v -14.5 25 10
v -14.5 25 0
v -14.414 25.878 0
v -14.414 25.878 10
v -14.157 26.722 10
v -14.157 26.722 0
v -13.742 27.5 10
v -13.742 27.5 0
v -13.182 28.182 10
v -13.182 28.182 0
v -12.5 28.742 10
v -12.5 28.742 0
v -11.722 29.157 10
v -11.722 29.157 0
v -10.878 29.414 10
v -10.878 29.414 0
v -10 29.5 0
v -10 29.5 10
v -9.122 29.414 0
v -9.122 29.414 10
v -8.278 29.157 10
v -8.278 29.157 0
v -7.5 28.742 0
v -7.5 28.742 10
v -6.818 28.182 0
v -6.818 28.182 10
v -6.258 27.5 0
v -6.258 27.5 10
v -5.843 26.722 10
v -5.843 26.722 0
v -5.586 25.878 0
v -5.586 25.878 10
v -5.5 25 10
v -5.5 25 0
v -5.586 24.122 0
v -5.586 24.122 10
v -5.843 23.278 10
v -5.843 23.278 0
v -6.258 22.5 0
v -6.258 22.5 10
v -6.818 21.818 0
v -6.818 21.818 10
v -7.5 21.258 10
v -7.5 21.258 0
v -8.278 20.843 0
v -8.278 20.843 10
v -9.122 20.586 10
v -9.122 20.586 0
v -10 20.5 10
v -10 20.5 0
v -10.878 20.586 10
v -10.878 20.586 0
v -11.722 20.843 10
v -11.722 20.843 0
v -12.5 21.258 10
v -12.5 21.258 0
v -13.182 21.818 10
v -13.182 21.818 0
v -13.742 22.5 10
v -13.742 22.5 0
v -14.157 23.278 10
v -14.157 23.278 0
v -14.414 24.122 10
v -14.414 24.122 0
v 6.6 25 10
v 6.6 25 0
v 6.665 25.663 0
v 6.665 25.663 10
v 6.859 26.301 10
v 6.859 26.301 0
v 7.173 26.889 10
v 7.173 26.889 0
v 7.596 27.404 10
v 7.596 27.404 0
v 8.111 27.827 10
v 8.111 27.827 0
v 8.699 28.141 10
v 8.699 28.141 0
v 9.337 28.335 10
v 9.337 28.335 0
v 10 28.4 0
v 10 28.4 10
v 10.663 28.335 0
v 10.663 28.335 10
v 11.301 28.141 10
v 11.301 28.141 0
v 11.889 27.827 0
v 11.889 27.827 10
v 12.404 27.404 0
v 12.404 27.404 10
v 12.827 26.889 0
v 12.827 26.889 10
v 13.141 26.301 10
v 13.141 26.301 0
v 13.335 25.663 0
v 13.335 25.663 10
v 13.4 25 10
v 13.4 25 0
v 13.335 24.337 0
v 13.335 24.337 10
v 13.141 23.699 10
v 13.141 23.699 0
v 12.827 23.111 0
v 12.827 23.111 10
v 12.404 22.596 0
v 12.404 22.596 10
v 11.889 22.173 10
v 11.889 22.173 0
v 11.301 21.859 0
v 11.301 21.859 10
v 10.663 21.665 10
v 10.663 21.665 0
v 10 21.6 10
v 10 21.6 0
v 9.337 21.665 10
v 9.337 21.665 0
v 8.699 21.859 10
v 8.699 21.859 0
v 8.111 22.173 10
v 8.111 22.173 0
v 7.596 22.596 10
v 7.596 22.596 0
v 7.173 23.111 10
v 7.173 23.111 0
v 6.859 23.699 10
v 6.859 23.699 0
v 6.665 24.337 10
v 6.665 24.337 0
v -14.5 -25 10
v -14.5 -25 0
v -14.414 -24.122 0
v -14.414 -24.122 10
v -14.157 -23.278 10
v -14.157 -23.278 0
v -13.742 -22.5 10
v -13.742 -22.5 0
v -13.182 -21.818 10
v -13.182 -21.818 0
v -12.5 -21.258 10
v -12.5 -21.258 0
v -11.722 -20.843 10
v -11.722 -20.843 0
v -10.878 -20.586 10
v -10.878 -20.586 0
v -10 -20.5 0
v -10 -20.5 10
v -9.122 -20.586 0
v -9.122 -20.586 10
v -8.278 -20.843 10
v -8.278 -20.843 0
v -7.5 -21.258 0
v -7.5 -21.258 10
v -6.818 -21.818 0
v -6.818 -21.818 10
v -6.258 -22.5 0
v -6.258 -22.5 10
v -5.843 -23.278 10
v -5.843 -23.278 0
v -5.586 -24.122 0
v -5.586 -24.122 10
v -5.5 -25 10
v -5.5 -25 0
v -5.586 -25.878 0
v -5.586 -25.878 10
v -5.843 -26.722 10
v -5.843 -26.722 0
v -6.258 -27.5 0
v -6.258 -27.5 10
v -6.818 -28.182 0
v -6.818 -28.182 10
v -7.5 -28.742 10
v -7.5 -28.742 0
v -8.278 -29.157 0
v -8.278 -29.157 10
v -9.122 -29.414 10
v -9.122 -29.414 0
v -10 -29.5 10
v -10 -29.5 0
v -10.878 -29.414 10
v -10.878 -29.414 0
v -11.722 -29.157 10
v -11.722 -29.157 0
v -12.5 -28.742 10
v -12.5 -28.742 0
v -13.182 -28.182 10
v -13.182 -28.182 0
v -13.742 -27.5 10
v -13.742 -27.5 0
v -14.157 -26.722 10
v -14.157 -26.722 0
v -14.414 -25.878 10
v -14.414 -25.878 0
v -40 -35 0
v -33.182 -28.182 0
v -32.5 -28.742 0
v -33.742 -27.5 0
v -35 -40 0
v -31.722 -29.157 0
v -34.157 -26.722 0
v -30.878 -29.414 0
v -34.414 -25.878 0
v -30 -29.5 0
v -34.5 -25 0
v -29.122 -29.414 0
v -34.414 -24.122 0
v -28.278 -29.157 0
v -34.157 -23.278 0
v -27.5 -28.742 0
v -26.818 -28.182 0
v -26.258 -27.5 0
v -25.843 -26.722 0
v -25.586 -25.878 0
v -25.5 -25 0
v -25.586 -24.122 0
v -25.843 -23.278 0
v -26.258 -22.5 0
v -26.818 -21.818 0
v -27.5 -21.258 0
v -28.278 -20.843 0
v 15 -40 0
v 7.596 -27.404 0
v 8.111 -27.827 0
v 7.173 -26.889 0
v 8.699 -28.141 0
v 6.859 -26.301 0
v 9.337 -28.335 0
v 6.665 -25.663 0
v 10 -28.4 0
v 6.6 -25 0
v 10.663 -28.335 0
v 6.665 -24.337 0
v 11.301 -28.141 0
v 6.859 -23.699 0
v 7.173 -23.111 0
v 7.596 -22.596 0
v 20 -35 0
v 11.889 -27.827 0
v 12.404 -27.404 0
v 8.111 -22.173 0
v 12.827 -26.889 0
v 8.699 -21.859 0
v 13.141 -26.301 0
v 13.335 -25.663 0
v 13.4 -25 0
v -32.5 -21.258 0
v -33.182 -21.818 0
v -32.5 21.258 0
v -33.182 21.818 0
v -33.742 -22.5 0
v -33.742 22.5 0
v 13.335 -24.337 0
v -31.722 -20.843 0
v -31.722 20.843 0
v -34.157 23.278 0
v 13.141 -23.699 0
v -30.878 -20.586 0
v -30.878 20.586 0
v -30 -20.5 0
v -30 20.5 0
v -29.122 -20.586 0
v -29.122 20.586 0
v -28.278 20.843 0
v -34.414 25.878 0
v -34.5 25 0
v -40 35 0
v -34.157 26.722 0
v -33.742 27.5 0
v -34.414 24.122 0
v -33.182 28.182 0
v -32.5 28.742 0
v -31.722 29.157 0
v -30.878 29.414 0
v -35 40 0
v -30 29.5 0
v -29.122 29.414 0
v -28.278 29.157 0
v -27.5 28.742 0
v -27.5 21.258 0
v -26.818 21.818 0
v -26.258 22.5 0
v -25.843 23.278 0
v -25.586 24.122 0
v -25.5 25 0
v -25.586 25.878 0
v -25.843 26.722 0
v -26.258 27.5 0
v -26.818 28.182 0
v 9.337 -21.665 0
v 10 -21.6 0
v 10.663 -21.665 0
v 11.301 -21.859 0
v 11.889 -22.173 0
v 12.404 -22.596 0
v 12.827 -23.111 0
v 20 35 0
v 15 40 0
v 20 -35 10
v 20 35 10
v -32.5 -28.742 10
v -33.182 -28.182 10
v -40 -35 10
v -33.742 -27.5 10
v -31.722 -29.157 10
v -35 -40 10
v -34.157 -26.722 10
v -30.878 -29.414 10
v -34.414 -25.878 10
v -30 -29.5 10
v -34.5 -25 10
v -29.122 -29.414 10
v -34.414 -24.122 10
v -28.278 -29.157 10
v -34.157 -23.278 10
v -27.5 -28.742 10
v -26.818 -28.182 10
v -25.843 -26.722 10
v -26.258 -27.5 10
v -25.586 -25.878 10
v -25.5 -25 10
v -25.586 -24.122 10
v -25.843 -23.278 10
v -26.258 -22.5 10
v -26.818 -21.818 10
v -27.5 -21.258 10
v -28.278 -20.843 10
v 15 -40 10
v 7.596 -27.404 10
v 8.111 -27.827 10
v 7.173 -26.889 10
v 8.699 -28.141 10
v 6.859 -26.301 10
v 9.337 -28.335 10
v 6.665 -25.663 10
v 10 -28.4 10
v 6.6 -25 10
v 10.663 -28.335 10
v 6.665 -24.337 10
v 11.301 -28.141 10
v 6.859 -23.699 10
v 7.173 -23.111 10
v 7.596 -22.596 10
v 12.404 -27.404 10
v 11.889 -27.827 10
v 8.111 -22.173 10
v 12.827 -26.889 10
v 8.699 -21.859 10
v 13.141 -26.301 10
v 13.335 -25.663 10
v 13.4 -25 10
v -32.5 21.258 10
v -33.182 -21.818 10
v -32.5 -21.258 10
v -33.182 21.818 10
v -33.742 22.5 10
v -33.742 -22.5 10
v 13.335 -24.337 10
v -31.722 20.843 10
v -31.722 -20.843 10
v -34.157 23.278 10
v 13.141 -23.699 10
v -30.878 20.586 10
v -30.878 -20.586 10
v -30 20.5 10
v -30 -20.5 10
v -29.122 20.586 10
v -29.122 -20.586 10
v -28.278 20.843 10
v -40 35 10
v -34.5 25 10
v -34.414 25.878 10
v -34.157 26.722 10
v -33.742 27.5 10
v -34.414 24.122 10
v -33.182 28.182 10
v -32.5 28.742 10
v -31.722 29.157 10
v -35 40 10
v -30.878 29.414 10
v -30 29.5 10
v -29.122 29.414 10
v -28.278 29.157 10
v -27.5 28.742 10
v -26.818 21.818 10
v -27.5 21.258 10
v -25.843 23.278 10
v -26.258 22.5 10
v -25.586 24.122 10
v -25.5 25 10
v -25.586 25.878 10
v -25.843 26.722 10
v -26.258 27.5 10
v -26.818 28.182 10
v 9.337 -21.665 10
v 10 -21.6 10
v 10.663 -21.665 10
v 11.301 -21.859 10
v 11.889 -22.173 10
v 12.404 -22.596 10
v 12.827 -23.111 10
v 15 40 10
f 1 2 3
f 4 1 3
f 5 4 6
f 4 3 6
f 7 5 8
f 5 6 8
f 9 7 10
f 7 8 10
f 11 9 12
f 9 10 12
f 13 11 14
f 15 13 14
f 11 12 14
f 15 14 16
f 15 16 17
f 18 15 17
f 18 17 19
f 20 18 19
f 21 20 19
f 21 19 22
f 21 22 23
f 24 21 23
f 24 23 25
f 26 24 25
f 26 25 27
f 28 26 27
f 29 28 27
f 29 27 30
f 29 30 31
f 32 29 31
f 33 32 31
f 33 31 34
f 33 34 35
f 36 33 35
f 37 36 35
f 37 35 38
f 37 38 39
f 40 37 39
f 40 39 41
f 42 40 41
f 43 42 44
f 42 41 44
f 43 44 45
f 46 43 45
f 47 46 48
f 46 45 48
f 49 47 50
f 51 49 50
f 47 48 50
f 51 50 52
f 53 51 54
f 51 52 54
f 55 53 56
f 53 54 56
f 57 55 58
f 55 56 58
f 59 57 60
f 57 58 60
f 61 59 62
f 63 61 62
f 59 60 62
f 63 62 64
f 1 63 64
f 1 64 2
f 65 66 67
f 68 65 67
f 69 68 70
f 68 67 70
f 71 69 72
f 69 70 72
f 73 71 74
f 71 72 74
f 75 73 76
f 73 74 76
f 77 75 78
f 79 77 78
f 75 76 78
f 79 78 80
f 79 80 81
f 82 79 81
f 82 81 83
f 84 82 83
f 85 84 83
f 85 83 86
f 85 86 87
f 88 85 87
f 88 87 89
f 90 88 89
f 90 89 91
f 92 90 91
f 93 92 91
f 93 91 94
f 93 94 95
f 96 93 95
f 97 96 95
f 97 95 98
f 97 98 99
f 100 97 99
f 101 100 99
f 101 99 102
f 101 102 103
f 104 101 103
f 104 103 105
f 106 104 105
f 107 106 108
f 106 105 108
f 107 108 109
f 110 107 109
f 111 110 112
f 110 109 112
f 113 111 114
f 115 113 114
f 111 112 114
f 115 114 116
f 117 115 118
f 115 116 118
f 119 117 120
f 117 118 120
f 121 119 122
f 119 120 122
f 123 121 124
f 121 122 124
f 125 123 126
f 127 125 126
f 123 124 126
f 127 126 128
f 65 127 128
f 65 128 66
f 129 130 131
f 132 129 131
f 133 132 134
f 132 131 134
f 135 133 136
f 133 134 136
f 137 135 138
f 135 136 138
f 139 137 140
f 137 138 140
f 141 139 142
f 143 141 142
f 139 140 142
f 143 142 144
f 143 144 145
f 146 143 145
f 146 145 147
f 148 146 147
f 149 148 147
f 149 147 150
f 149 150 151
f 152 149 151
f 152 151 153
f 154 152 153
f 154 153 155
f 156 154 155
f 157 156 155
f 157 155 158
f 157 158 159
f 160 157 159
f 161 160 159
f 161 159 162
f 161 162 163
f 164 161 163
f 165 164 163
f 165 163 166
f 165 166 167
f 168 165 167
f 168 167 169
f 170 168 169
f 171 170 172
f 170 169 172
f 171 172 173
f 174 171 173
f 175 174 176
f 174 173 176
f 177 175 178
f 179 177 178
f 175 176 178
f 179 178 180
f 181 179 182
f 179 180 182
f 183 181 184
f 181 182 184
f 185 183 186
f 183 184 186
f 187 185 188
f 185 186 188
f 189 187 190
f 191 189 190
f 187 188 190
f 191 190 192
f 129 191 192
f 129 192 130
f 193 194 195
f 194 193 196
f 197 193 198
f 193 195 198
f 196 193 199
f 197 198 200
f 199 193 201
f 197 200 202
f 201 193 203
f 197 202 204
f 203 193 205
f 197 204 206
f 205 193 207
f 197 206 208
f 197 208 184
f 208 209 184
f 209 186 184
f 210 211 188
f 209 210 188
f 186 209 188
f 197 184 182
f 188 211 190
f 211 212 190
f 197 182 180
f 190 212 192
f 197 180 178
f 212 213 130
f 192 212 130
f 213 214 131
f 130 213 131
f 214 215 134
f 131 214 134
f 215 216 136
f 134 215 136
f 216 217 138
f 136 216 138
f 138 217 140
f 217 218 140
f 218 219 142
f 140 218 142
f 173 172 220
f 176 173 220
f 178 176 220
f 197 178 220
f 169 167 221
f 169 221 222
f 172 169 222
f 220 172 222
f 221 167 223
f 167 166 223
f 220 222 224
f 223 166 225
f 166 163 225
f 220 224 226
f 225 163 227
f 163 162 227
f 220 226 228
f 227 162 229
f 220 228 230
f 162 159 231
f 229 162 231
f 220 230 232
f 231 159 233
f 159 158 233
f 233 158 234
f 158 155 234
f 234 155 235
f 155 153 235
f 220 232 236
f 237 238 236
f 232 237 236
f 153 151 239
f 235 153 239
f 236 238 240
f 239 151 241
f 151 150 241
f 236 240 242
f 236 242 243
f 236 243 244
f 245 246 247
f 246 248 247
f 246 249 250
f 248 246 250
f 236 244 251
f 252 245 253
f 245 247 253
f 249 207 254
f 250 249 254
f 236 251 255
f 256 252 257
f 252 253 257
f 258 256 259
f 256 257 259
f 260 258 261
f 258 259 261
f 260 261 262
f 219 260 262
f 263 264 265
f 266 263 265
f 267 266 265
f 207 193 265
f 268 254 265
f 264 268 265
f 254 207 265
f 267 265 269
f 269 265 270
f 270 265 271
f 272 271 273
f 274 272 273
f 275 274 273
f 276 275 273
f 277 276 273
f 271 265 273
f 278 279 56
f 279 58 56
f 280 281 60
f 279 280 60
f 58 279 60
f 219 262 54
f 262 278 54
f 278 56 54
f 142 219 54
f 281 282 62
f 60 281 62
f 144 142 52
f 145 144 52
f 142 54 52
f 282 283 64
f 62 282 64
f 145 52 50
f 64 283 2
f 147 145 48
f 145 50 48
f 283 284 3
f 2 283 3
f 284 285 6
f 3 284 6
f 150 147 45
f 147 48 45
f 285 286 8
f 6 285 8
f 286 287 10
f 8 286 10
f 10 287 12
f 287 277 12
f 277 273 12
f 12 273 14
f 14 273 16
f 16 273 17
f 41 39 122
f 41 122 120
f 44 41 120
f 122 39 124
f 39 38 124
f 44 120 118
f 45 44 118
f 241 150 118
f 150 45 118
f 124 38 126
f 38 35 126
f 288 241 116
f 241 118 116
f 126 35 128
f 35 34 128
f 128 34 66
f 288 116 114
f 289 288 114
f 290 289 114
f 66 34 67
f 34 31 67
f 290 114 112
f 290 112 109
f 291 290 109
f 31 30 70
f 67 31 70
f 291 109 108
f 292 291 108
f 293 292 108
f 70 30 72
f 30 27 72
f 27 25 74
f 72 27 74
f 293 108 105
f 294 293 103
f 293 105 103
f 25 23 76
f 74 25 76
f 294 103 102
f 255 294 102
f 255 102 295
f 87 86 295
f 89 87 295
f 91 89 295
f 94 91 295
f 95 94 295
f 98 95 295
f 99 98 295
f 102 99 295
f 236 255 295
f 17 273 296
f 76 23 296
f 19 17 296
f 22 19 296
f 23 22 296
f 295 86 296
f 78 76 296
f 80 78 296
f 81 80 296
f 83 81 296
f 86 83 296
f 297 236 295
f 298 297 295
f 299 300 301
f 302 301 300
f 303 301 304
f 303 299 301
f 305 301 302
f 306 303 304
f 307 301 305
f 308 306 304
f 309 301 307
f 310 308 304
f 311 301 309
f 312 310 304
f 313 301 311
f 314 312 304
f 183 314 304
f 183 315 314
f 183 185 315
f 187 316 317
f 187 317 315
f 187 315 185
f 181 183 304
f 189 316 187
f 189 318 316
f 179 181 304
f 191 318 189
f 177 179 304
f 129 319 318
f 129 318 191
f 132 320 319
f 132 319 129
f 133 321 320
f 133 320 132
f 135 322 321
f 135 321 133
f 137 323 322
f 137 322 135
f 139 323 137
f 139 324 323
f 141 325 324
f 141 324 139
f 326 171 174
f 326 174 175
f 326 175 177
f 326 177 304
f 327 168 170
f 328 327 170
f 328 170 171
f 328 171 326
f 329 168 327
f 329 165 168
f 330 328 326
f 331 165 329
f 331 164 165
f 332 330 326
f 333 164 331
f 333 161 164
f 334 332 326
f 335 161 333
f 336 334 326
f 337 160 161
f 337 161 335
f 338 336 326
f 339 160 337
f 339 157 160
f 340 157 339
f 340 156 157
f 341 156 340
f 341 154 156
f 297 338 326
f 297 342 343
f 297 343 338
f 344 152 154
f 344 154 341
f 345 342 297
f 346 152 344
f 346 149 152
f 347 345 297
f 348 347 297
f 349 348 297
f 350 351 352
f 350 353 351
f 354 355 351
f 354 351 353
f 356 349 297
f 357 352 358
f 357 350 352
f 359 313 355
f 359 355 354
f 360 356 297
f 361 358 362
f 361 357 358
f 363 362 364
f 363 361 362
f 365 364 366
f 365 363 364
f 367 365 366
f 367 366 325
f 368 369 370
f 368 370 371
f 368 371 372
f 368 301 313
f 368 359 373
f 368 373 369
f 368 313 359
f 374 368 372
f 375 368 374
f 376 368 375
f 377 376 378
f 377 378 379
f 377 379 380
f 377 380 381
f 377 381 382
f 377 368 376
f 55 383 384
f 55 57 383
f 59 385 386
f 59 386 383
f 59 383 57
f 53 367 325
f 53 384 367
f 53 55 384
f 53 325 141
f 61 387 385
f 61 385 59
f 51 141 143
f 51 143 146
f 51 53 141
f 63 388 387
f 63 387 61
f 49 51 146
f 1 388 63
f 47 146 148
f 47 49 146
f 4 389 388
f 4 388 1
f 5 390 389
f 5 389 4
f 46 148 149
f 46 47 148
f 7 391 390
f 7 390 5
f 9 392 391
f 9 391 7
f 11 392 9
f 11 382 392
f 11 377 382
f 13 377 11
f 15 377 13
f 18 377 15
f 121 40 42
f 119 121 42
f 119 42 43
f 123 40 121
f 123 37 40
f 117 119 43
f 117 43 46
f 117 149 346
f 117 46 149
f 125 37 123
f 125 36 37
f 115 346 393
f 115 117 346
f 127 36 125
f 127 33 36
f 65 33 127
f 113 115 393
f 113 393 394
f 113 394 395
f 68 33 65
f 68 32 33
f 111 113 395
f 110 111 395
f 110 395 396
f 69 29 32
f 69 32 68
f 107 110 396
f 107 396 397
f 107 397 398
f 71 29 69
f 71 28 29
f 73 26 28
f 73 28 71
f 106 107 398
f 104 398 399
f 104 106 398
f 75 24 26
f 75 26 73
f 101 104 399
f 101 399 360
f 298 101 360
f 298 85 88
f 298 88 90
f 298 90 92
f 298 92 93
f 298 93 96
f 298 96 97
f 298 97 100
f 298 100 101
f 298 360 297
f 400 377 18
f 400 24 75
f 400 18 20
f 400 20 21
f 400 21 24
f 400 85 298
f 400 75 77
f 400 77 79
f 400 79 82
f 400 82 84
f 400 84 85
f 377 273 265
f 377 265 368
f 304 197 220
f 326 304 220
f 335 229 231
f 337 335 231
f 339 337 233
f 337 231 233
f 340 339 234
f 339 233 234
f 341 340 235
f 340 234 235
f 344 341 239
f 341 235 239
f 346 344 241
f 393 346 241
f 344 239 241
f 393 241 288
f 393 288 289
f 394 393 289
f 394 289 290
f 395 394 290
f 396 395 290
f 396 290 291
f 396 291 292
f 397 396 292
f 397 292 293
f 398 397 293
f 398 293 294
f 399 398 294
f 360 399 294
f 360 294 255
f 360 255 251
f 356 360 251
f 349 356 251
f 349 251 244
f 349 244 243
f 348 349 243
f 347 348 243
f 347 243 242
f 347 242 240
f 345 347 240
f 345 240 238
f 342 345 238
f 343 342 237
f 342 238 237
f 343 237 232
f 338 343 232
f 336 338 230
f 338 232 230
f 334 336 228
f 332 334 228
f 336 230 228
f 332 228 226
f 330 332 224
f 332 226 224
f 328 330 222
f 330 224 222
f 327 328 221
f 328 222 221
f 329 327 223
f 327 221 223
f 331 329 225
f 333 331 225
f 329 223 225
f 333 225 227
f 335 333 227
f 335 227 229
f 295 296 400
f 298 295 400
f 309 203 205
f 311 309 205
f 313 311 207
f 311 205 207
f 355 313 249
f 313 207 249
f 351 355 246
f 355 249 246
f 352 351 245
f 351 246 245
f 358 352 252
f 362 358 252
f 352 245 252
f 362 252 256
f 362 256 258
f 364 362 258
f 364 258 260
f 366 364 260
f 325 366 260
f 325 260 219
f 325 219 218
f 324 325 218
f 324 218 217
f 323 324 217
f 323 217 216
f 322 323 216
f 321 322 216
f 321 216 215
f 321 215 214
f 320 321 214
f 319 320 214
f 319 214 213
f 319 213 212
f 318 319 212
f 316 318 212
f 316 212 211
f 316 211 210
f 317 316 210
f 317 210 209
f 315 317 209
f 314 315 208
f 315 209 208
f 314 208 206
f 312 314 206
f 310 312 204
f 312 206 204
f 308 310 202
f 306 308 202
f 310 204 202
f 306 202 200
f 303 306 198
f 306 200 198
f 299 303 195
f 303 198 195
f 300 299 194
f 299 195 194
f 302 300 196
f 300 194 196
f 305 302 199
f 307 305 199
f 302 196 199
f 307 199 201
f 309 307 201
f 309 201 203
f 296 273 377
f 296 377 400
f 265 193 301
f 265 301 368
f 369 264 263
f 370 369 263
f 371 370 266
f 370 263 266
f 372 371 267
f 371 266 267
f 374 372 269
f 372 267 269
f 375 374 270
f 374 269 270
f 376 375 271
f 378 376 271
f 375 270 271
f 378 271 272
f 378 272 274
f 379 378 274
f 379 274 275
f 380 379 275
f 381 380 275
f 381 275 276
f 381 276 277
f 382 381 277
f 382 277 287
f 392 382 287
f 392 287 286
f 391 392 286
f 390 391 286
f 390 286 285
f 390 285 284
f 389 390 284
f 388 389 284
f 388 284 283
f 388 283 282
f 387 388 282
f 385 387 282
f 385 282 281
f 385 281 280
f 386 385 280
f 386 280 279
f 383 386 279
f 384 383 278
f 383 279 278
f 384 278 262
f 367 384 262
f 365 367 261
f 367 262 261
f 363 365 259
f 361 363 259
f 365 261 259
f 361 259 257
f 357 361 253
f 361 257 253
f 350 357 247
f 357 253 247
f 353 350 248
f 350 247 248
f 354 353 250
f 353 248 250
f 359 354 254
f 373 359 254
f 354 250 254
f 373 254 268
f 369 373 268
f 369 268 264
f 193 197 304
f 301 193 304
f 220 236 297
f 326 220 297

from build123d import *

# Parameters (mm, degrees)
SKETCH_1_W                = 60
SKETCH_1_H                = 80
EXTRUDE_1_DEPTH           = 10
CHAMFER_1_SIZE            = 5
HOLE_WIZARD_9_0_9_1_D     = 9
HOLE_WIZARD_9_0_9_1_DEPTH = 34.5
HOLE_WIZARD_9_0_9_1_TIP   = 2.703872786
HOLE_WIZARD_M8_3_D        = 6.8
HOLE_WIZARD_M8_3_DEPTH    = 22.25
HOLE_WIZARD_M8_3_TIP      = 2.042926105


with BuildPart() as part:
    # 草图1 → 凸台-拉伸1 (new body)
    with BuildSketch(Plane.XY):
        with Locations((-10, 0)):
            Rectangle(SKETCH_1_W, SKETCH_1_H)
    extrude(amount=EXTRUDE_1_DEPTH)

    # 倒角1
    chamfer_1_edges = [part.edges().sort_by_distance(p)[0] for p in [
        (20, -40, 5),
        (-40, -40, 5),
        (-40, 40, 5),
        (20, 40, 5),
    ]]
    chamfer(chamfer_1_edges, length=CHAMFER_1_SIZE)

    # Ø9.0 (9) 直径孔1
    with Locations(Plane.XY.offset(10)):
        with Locations((-30, 25), (-30, -25), (-10, -25), (-10, 25)):
            Hole(HOLE_WIZARD_9_0_9_1_D / 2, depth=HOLE_WIZARD_9_0_9_1_DEPTH)
            with Locations((0, 0, -(HOLE_WIZARD_9_0_9_1_DEPTH + HOLE_WIZARD_9_0_9_1_TIP / 2))):  # 118° drill point
                Cone(0, HOLE_WIZARD_9_0_9_1_D / 2, HOLE_WIZARD_9_0_9_1_TIP, mode=Mode.SUBTRACT)

    # M8 螺纹孔3
    with Locations(Plane.XY.offset(10)):
        with Locations((10, -25), (10, 25)):
            Hole(HOLE_WIZARD_M8_3_D / 2, depth=HOLE_WIZARD_M8_3_DEPTH)
            with Locations((0, 0, -(HOLE_WIZARD_M8_3_DEPTH + HOLE_WIZARD_M8_3_TIP / 2))):  # 118° drill point
                Cone(0, HOLE_WIZARD_M8_3_D / 2, HOLE_WIZARD_M8_3_TIP, mode=Mode.SUBTRACT)


solid = part.part
